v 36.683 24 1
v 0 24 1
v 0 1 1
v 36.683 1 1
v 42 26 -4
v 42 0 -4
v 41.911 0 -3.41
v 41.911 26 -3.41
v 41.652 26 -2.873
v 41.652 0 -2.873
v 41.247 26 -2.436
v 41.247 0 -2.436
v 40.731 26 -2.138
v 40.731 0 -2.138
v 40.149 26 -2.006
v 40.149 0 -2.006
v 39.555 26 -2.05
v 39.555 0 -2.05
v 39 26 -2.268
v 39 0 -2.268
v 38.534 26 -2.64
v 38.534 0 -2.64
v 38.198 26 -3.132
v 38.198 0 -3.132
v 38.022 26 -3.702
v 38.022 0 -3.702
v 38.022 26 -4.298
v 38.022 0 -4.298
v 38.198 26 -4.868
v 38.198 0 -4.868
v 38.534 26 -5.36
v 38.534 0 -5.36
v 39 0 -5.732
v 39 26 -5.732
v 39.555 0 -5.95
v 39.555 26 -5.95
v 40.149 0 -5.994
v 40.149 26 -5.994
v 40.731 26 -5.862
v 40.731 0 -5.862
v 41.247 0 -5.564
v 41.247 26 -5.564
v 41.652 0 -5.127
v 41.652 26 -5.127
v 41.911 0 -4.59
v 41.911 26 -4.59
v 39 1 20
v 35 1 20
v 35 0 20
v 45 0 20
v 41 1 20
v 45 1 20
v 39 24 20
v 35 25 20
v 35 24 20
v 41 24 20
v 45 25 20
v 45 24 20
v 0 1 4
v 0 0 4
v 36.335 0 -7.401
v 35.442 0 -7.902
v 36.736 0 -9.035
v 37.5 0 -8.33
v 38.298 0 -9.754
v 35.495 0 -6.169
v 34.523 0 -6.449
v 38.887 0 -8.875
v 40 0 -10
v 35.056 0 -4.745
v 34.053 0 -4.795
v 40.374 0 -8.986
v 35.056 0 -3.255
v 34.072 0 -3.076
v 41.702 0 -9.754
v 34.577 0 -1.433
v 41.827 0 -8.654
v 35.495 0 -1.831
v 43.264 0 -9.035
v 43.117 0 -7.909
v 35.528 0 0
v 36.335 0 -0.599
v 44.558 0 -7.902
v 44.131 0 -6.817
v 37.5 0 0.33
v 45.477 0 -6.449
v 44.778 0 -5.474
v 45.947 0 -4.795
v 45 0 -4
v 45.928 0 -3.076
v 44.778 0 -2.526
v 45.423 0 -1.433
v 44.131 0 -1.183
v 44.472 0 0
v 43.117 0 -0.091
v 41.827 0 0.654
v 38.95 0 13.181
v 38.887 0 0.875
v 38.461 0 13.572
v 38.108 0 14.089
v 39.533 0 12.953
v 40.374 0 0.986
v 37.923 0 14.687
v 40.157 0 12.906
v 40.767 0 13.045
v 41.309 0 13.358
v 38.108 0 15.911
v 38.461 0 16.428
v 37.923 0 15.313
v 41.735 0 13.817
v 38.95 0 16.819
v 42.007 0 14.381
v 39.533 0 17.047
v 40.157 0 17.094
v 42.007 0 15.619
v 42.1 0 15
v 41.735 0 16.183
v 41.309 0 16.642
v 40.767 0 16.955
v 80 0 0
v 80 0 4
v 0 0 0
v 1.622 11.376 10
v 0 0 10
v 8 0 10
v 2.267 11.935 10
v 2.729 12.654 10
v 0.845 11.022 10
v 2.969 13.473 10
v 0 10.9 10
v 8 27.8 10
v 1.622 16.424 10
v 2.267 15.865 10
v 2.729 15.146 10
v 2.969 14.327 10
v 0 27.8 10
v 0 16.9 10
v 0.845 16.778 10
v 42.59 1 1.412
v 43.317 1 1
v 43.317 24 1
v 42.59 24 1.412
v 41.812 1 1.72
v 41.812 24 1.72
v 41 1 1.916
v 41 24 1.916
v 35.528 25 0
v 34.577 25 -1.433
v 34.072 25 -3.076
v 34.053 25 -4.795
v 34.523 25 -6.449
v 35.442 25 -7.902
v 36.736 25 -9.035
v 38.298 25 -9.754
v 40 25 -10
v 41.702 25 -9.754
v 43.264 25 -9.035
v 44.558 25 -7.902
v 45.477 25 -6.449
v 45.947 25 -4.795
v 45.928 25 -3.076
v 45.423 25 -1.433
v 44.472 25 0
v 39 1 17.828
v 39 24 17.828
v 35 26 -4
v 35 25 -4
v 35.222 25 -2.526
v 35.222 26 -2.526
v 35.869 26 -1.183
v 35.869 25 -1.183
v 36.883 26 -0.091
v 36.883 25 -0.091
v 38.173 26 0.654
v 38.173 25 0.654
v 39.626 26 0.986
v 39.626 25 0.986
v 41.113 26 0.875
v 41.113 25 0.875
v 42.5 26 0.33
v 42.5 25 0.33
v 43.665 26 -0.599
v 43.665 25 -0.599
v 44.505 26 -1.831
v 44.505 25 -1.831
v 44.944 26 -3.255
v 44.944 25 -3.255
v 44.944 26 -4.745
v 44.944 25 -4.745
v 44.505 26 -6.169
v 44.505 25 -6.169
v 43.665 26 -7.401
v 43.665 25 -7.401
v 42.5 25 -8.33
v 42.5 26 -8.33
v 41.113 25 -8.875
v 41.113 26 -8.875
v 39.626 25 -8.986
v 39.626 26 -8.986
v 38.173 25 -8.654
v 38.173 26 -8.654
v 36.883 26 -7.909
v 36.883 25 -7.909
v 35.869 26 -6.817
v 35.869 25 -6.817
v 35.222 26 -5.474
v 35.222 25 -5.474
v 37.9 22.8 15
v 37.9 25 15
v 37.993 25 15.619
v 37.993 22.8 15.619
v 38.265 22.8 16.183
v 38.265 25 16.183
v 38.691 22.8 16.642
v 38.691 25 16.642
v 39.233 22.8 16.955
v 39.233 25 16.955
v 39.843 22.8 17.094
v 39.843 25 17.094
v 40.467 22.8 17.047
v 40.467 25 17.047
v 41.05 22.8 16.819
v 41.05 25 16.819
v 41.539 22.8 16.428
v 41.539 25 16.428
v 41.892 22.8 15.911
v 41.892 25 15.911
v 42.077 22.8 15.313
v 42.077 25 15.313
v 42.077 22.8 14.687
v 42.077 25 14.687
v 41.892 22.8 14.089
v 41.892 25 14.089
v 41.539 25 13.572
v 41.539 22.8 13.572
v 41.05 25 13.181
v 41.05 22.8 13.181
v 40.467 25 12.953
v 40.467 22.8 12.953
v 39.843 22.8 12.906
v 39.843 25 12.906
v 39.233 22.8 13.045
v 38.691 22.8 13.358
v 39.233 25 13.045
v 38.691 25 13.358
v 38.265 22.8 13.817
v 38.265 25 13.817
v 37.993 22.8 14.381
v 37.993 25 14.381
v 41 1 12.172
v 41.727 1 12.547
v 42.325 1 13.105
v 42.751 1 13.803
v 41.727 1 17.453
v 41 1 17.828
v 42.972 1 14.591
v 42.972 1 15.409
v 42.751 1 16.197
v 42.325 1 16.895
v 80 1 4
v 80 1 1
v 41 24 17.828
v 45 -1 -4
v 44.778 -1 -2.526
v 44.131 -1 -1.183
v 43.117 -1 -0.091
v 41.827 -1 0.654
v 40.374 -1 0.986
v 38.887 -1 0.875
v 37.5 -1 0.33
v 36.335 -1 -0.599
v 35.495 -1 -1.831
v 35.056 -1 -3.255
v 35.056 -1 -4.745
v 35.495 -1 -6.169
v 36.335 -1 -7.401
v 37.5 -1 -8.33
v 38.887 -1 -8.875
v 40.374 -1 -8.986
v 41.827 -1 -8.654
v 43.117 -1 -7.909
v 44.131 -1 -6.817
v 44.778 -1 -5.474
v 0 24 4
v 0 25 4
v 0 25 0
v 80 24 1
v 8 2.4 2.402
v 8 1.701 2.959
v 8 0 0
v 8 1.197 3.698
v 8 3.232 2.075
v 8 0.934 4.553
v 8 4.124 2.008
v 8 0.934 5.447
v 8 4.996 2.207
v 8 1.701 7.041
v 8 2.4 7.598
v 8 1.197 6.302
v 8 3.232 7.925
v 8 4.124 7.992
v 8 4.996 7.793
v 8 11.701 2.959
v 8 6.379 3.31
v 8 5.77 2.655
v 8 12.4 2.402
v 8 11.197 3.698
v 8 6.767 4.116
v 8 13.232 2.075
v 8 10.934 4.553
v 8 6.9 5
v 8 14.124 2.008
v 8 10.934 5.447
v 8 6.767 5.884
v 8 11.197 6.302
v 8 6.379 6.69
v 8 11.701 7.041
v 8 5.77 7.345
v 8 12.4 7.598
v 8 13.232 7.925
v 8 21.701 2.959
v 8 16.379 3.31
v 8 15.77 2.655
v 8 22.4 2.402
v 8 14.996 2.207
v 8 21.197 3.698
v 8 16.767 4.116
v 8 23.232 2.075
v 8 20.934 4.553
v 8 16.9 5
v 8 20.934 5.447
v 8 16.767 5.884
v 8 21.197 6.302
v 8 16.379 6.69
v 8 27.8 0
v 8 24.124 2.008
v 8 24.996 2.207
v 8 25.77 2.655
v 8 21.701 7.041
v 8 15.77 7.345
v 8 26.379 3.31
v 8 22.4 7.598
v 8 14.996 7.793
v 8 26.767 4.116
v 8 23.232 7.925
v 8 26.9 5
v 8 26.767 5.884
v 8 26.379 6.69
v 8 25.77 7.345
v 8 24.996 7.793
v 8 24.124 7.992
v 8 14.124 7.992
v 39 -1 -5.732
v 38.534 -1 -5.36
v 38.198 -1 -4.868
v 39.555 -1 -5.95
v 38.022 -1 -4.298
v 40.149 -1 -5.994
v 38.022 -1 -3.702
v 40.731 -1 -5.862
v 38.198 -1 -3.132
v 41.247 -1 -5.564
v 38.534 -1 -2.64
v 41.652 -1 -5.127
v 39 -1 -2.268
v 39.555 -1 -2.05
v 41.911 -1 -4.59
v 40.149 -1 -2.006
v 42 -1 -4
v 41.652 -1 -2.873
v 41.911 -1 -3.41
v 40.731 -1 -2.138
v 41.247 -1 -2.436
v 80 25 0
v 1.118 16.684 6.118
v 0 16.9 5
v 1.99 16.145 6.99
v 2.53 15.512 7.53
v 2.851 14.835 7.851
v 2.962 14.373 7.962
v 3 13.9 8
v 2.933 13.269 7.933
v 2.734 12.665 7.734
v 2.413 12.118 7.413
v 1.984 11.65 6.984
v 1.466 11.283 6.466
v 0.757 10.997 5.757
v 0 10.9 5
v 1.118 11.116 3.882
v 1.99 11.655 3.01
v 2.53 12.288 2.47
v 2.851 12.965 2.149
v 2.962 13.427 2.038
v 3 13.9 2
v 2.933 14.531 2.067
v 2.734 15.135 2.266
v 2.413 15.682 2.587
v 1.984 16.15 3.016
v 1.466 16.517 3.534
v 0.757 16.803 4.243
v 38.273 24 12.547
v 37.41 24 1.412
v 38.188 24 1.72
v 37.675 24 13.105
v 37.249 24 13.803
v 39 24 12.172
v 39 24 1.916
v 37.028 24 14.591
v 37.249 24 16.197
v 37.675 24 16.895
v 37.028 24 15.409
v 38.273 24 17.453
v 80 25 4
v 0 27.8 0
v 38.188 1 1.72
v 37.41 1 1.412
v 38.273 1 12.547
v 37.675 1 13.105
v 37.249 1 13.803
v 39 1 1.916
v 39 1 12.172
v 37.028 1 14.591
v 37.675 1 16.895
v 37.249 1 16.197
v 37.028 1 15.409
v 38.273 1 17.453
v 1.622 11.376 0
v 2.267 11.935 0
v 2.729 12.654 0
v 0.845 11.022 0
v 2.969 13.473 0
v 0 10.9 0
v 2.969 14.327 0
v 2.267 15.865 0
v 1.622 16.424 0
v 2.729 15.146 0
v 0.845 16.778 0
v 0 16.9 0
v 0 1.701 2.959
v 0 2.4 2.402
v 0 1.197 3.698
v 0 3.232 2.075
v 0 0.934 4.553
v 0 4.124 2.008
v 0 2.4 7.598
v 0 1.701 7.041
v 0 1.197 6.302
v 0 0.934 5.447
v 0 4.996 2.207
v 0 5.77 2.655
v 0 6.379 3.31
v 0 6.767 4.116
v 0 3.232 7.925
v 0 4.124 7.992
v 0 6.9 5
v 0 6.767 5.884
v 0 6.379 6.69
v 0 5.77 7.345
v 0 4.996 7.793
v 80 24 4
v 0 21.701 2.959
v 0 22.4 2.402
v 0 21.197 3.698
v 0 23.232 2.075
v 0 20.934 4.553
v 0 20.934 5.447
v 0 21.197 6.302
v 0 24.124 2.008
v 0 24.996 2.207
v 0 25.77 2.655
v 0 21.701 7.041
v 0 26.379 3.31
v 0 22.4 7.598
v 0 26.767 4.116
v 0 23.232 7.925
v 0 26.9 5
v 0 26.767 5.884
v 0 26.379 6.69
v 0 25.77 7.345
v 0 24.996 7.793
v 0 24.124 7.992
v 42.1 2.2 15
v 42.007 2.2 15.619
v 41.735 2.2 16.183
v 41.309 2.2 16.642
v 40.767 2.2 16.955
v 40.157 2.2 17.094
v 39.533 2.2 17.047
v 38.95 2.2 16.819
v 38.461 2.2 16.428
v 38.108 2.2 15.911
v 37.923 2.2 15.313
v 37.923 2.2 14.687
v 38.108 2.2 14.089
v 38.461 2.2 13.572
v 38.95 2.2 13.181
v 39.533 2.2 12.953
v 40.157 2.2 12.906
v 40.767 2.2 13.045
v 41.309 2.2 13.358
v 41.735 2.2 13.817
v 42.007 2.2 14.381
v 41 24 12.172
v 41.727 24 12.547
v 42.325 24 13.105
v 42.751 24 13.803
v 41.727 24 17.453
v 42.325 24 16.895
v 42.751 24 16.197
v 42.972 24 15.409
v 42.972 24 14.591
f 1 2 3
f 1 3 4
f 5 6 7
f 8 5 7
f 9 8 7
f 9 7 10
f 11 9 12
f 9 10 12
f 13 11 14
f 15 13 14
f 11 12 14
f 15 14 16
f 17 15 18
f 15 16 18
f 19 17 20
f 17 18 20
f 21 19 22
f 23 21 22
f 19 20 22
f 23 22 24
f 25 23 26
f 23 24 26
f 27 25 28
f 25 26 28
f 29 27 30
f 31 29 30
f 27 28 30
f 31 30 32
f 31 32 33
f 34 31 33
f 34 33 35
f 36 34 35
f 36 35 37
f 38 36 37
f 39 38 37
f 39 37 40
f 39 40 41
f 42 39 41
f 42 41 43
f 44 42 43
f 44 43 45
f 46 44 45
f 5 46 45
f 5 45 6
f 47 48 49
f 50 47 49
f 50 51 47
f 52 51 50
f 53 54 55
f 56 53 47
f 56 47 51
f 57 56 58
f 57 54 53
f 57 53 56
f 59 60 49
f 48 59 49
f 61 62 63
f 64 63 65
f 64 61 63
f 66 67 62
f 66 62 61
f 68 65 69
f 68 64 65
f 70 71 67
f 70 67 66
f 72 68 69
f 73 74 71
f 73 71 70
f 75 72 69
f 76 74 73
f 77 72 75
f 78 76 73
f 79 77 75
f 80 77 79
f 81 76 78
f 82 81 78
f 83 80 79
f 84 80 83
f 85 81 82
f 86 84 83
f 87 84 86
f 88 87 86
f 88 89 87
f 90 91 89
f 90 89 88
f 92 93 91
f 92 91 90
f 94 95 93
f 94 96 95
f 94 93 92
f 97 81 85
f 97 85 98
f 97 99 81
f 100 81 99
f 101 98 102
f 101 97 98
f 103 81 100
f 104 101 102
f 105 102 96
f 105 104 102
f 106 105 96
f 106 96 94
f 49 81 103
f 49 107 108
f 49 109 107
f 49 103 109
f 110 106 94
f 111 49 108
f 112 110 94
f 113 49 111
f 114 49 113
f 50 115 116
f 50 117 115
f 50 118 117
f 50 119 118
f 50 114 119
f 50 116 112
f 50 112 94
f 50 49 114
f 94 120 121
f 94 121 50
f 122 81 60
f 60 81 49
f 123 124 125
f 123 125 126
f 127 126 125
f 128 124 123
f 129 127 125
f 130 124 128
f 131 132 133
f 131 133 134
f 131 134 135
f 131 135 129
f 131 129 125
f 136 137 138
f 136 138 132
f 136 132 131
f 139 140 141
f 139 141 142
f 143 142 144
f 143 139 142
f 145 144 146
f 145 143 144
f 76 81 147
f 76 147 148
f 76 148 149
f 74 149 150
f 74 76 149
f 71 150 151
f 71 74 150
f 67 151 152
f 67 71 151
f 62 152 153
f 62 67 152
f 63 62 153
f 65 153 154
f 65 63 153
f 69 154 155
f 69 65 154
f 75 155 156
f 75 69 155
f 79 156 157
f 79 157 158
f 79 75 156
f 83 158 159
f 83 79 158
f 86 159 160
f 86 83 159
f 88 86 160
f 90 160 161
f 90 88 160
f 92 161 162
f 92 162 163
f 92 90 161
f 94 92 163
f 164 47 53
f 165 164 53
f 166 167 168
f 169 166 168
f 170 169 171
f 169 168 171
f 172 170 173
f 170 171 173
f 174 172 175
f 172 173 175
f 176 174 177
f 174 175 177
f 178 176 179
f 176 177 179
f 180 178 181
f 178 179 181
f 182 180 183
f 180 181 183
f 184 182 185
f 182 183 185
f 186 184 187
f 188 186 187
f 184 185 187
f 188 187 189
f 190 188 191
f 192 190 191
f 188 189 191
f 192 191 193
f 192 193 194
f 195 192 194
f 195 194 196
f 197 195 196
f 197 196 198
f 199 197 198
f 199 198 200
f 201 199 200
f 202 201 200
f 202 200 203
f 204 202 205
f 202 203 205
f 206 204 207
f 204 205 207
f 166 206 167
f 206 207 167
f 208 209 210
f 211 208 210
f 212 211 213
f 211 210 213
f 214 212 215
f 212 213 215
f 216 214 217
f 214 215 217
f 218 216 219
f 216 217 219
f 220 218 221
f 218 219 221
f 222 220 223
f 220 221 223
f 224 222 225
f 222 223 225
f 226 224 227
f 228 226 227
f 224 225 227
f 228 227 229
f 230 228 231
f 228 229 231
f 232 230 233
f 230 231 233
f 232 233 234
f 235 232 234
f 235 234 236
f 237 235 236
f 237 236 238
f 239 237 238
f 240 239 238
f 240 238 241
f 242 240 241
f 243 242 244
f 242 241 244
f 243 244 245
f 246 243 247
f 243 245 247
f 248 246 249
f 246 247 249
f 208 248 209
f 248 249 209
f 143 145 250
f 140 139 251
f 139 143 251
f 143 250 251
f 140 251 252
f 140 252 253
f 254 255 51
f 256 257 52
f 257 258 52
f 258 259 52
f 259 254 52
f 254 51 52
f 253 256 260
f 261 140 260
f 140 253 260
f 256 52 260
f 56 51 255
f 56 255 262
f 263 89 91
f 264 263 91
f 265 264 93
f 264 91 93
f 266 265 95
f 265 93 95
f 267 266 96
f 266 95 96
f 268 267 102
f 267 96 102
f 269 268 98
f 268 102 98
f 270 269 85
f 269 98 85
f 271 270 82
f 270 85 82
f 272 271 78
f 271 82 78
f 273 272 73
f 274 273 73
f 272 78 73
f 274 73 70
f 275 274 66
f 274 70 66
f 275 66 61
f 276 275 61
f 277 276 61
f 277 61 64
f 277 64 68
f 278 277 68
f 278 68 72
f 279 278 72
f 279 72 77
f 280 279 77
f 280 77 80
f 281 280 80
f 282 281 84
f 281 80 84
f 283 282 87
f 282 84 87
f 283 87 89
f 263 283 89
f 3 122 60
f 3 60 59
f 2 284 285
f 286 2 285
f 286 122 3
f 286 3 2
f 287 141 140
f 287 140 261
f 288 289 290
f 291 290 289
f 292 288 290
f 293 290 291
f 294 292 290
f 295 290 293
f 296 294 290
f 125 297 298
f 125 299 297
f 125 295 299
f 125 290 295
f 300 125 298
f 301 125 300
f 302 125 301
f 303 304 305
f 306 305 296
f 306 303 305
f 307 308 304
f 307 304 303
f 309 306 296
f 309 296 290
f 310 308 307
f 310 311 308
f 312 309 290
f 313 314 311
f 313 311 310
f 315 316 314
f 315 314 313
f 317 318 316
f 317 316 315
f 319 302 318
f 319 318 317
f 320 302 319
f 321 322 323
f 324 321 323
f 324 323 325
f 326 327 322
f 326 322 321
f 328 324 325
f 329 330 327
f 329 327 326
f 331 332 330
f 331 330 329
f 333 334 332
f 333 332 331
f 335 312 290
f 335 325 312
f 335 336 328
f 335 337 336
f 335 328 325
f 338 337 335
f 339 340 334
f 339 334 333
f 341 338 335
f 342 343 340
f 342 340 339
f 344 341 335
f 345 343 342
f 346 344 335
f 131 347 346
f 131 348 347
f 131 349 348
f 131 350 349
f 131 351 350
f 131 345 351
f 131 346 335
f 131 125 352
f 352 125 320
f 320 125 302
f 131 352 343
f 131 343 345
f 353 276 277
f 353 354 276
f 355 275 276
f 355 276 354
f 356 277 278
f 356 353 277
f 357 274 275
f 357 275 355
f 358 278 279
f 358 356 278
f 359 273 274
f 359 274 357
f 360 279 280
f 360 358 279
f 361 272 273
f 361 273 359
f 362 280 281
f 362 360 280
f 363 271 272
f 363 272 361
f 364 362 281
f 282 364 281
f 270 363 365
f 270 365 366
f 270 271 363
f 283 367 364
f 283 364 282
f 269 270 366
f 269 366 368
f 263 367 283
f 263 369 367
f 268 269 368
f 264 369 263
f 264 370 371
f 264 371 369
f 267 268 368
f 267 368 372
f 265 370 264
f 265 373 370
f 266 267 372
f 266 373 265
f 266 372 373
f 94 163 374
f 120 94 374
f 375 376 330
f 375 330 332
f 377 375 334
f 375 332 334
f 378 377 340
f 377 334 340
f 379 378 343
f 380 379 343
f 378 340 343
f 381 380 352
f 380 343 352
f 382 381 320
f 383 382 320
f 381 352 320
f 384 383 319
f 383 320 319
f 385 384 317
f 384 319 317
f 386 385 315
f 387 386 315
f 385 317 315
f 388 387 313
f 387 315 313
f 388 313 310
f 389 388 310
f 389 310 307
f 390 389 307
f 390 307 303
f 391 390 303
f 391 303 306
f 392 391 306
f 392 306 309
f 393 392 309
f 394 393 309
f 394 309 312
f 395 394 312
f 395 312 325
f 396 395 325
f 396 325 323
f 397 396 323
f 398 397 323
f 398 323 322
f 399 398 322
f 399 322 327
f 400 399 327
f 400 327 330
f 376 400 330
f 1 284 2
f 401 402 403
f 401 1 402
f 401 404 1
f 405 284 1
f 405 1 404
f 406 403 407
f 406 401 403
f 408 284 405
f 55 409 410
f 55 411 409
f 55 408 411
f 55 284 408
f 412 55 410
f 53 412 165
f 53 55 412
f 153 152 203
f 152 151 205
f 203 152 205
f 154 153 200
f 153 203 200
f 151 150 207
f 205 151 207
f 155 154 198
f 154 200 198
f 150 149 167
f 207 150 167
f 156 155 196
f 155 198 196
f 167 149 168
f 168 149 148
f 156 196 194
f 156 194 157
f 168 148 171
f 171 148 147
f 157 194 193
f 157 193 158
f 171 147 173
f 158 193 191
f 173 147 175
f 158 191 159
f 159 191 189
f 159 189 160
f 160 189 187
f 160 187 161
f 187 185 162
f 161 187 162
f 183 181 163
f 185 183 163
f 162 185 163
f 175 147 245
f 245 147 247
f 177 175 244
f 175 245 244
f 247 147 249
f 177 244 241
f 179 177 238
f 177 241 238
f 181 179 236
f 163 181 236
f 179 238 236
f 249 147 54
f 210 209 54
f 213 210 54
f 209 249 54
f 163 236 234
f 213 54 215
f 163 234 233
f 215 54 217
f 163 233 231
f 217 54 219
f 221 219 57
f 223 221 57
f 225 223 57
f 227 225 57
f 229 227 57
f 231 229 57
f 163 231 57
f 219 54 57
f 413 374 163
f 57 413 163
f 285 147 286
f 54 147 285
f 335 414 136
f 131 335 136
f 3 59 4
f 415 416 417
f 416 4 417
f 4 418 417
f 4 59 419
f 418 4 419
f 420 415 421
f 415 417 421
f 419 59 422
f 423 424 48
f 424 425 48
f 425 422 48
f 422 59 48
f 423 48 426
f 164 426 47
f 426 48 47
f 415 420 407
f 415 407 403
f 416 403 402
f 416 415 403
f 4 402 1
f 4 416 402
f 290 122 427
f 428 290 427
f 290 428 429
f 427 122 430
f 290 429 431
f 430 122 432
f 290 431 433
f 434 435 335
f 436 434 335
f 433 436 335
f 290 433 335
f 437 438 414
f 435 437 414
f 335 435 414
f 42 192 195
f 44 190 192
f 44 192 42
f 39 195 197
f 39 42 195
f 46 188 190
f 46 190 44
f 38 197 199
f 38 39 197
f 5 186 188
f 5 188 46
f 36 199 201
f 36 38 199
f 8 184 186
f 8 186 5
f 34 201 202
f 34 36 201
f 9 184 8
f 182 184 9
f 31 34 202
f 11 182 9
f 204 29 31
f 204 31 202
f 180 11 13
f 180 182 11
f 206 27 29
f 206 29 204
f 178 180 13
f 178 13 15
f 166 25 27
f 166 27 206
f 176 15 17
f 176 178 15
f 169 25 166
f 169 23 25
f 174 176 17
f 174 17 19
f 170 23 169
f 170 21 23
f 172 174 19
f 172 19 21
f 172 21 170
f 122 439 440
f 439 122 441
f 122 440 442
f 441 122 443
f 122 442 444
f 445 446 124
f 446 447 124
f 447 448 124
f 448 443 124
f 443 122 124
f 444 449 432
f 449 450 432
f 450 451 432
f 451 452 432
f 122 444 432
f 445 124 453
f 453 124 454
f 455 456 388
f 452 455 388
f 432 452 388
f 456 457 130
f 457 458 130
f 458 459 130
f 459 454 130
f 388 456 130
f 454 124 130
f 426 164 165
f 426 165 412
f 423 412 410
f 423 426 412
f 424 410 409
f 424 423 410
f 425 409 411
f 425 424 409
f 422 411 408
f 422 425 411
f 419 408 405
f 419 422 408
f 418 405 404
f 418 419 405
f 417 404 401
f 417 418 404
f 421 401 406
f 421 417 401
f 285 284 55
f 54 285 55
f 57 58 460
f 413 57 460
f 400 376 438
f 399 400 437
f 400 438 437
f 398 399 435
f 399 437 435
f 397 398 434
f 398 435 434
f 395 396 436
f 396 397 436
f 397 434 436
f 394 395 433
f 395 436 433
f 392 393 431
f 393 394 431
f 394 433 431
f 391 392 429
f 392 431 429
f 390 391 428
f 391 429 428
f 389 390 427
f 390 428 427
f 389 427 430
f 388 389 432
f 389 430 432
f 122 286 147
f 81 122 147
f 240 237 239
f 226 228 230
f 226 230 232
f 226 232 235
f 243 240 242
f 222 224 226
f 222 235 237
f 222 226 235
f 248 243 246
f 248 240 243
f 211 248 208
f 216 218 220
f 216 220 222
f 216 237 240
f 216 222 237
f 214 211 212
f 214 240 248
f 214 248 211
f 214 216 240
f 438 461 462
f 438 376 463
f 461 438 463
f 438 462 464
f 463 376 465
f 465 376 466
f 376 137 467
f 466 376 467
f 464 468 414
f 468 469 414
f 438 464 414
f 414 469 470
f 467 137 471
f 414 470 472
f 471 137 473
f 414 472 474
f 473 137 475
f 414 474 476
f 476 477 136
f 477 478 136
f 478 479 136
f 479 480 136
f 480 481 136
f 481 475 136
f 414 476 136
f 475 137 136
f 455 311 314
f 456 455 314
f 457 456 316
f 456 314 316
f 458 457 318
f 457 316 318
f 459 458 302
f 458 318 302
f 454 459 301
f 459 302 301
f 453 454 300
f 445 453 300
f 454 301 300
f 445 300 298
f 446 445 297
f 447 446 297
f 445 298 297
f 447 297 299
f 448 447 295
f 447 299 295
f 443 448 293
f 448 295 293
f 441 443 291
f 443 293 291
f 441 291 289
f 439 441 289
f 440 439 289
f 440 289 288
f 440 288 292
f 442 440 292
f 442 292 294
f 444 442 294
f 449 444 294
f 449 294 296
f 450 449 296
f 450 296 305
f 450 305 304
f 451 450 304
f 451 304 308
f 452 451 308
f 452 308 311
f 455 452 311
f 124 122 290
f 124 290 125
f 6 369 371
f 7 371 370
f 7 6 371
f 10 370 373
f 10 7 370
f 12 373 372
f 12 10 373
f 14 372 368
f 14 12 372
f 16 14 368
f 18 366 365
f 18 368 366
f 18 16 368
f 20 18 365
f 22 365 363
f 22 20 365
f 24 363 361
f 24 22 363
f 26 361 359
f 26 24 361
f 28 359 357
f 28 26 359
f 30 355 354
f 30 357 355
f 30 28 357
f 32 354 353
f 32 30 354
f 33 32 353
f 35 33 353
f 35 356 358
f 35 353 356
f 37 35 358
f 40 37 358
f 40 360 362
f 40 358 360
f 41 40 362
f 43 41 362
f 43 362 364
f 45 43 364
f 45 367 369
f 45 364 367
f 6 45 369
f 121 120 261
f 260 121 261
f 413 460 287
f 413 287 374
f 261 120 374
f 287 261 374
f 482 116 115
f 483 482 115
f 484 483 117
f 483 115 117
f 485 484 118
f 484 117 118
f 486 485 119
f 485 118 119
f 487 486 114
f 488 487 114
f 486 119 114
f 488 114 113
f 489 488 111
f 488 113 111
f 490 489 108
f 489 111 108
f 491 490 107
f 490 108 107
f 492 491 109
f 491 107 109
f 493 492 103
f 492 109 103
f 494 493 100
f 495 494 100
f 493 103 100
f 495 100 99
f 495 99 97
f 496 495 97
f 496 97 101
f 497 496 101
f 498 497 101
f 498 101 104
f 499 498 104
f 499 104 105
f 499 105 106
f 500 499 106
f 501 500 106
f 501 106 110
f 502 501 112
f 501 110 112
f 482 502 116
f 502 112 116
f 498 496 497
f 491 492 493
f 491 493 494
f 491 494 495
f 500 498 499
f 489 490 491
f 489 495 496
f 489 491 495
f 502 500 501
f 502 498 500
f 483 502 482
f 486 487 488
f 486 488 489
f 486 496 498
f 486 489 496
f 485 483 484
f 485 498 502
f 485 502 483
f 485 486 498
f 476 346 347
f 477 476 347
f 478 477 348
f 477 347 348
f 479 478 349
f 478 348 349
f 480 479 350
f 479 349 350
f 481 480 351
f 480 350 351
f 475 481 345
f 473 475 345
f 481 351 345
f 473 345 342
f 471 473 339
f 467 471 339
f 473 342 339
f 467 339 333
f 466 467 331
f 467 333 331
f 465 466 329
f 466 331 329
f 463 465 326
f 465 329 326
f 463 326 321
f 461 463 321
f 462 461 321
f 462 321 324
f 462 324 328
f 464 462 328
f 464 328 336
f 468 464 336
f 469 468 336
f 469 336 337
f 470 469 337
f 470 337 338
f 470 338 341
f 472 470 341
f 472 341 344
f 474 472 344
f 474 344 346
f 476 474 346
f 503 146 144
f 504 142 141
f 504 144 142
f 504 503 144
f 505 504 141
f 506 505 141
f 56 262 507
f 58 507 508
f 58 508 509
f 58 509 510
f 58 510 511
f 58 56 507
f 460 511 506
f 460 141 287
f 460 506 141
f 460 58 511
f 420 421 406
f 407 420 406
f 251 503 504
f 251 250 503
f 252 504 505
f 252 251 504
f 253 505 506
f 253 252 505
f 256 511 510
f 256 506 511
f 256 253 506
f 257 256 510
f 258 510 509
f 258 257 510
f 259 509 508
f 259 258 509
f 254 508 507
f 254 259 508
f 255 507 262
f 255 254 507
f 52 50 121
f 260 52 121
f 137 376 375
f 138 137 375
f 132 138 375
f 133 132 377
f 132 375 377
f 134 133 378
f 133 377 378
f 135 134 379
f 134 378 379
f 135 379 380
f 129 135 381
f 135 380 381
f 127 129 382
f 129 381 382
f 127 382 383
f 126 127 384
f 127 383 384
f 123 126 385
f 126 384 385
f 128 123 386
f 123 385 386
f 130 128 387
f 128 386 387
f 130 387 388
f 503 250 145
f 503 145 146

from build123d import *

# Parameters (mm, degrees)
SKETCH_W             = 80
SKETCH_H             = 25
PAD_DEPTH            = 20
SKETCH001_W          = 39
SKETCH001_H          = 23
POCKET_DEPTH         = 19
POCKET001_DEPTH      = 25.001
SKETCH003_R          = 3
PAD001_DEPTH         = 25
SKETCH004_R          = 2.1
POCKET002_DEPTH      = 2.2
SKETCH007_R          = 2.1
POCKET004_DEPTH      = 2.2
SKETCH005_R          = 6
PAD002_DEPTH         = 25
SKETCH006_R          = 5
PAD003_DEPTH         = 1
SKETCH009_R          = 5
PAD004_DEPTH         = 1
SKETCH008_R          = 2
POCKET005_DEPTH      = 26.001
POCKET005_DEPTH_BACK = -1.001
SKETCH010_W          = 27.8
SKETCH010_H          = 10
PAD005_DEPTH         = 8
SKETCH011_R          = 3
POCKET006_DEPTH      = 8.001
SKETCH012_R          = 3
HOLE_DEPTH           = 10.001


with BuildPart() as flipflop:
    # Sketch → Pad (new body)
    with BuildSketch(Plane.XY):
        with Locations((40, 12.5)):
            Rectangle(SKETCH_W, SKETCH_H)
    extrude(amount=PAD_DEPTH)

    # Sketch001 (on Face6 of Pad) → Pocket (cut)
    with BuildSketch(Plane.XY.offset(20)):
        with Locations((19.5, 12.5)):
            Rectangle(SKETCH001_W, SKETCH001_H)
        with Locations((60.5, 12.5)):
            Rectangle(SKETCH001_W, SKETCH001_H)
    extrude(amount=-POCKET_DEPTH, mode=Mode.SUBTRACT)

    # Sketch002 → Pocket001 (cut, through all)
    with BuildSketch(Plane.XZ):
        Polygon((0, 4), (35, 20), (0, 20), align=None)
        Polygon((80, 4), (80, 20), (45, 20), align=None)
    extrude(amount=-POCKET001_DEPTH, mode=Mode.SUBTRACT)

    # Sketch003 → Pad001 (join)
    with BuildSketch(Plane.XZ):
        with Locations((40, 15)):
            Circle(SKETCH003_R)
    extrude(amount=-PAD001_DEPTH)

    # Sketch004 → Pocket002 (cut)
    with BuildSketch(Plane.XZ):
        with Locations((40, 15)):
            Circle(SKETCH004_R)
    extrude(amount=-POCKET002_DEPTH, mode=Mode.SUBTRACT)

    # Sketch007 → Pocket004 (cut)
    with BuildSketch(Plane(origin=(0, 25, 0), x_dir=(-1, 0, 0), z_dir=(0, 1, 0))):
        with Locations((-40, 15)):
            Circle(SKETCH007_R)
    extrude(amount=-POCKET004_DEPTH, mode=Mode.SUBTRACT)

    # Sketch005 → Pad002 (join)
    with BuildSketch(Plane.XZ):
        with Locations((40, -4)):
            Circle(SKETCH005_R)
    extrude(amount=-PAD002_DEPTH)

    # Sketch006 → Pad003 (join)
    with BuildSketch(Plane.XZ):
        with Locations((40, -4)):
            Circle(SKETCH006_R)
    extrude(amount=PAD003_DEPTH)

    # Sketch009 (on Face1 of Pocket005) → Pad004 (join)
    with BuildSketch(Plane(origin=(0, 25, 0), x_dir=(-1, 0, 0), z_dir=(0, 1, 0))):
        with Locations((-40, -4)):
            Circle(SKETCH009_R)
    extrude(amount=PAD004_DEPTH)

    # Sketch008 → Pocket005 (cut, two sides)
    with BuildSketch(Plane.XZ) as pocket005_sk:
        with Locations((40, -4)):
            Circle(SKETCH008_R)
    extrude(amount=-POCKET005_DEPTH, mode=Mode.SUBTRACT)
    extrude(pocket005_sk.sketch, amount=-POCKET005_DEPTH_BACK, mode=Mode.SUBTRACT)


with BuildPart() as endanschlag:
    # Sketch010 → Pad005 (new body)
    with BuildSketch(Plane.YZ):
        with Locations((13.9, 5)):
            Rectangle(SKETCH010_W, SKETCH010_H)
    extrude(amount=PAD005_DEPTH)

    # Sketch011 (on DatumPlane) → Pocket006 (cut, through all)
    with BuildSketch(Plane.YZ.offset(8)):
        with Locations((3.9, 5)):
            Circle(SKETCH011_R)
        with Locations((23.9, 5)):
            Circle(SKETCH011_R)
        with Locations((13.9, 5)):
            Circle(SKETCH011_R)
    extrude(amount=-POCKET006_DEPTH, mode=Mode.SUBTRACT)

    # Sketch012 (on DatumPlane) → Hole (cut, through all)
    with BuildSketch(Plane.YX):
        with Locations((13.9, 0)):
            Circle(SKETCH012_R)
    extrude(amount=-HOLE_DEPTH, mode=Mode.SUBTRACT)


solid = Compound([flipflop.part, endanschlag.part])
